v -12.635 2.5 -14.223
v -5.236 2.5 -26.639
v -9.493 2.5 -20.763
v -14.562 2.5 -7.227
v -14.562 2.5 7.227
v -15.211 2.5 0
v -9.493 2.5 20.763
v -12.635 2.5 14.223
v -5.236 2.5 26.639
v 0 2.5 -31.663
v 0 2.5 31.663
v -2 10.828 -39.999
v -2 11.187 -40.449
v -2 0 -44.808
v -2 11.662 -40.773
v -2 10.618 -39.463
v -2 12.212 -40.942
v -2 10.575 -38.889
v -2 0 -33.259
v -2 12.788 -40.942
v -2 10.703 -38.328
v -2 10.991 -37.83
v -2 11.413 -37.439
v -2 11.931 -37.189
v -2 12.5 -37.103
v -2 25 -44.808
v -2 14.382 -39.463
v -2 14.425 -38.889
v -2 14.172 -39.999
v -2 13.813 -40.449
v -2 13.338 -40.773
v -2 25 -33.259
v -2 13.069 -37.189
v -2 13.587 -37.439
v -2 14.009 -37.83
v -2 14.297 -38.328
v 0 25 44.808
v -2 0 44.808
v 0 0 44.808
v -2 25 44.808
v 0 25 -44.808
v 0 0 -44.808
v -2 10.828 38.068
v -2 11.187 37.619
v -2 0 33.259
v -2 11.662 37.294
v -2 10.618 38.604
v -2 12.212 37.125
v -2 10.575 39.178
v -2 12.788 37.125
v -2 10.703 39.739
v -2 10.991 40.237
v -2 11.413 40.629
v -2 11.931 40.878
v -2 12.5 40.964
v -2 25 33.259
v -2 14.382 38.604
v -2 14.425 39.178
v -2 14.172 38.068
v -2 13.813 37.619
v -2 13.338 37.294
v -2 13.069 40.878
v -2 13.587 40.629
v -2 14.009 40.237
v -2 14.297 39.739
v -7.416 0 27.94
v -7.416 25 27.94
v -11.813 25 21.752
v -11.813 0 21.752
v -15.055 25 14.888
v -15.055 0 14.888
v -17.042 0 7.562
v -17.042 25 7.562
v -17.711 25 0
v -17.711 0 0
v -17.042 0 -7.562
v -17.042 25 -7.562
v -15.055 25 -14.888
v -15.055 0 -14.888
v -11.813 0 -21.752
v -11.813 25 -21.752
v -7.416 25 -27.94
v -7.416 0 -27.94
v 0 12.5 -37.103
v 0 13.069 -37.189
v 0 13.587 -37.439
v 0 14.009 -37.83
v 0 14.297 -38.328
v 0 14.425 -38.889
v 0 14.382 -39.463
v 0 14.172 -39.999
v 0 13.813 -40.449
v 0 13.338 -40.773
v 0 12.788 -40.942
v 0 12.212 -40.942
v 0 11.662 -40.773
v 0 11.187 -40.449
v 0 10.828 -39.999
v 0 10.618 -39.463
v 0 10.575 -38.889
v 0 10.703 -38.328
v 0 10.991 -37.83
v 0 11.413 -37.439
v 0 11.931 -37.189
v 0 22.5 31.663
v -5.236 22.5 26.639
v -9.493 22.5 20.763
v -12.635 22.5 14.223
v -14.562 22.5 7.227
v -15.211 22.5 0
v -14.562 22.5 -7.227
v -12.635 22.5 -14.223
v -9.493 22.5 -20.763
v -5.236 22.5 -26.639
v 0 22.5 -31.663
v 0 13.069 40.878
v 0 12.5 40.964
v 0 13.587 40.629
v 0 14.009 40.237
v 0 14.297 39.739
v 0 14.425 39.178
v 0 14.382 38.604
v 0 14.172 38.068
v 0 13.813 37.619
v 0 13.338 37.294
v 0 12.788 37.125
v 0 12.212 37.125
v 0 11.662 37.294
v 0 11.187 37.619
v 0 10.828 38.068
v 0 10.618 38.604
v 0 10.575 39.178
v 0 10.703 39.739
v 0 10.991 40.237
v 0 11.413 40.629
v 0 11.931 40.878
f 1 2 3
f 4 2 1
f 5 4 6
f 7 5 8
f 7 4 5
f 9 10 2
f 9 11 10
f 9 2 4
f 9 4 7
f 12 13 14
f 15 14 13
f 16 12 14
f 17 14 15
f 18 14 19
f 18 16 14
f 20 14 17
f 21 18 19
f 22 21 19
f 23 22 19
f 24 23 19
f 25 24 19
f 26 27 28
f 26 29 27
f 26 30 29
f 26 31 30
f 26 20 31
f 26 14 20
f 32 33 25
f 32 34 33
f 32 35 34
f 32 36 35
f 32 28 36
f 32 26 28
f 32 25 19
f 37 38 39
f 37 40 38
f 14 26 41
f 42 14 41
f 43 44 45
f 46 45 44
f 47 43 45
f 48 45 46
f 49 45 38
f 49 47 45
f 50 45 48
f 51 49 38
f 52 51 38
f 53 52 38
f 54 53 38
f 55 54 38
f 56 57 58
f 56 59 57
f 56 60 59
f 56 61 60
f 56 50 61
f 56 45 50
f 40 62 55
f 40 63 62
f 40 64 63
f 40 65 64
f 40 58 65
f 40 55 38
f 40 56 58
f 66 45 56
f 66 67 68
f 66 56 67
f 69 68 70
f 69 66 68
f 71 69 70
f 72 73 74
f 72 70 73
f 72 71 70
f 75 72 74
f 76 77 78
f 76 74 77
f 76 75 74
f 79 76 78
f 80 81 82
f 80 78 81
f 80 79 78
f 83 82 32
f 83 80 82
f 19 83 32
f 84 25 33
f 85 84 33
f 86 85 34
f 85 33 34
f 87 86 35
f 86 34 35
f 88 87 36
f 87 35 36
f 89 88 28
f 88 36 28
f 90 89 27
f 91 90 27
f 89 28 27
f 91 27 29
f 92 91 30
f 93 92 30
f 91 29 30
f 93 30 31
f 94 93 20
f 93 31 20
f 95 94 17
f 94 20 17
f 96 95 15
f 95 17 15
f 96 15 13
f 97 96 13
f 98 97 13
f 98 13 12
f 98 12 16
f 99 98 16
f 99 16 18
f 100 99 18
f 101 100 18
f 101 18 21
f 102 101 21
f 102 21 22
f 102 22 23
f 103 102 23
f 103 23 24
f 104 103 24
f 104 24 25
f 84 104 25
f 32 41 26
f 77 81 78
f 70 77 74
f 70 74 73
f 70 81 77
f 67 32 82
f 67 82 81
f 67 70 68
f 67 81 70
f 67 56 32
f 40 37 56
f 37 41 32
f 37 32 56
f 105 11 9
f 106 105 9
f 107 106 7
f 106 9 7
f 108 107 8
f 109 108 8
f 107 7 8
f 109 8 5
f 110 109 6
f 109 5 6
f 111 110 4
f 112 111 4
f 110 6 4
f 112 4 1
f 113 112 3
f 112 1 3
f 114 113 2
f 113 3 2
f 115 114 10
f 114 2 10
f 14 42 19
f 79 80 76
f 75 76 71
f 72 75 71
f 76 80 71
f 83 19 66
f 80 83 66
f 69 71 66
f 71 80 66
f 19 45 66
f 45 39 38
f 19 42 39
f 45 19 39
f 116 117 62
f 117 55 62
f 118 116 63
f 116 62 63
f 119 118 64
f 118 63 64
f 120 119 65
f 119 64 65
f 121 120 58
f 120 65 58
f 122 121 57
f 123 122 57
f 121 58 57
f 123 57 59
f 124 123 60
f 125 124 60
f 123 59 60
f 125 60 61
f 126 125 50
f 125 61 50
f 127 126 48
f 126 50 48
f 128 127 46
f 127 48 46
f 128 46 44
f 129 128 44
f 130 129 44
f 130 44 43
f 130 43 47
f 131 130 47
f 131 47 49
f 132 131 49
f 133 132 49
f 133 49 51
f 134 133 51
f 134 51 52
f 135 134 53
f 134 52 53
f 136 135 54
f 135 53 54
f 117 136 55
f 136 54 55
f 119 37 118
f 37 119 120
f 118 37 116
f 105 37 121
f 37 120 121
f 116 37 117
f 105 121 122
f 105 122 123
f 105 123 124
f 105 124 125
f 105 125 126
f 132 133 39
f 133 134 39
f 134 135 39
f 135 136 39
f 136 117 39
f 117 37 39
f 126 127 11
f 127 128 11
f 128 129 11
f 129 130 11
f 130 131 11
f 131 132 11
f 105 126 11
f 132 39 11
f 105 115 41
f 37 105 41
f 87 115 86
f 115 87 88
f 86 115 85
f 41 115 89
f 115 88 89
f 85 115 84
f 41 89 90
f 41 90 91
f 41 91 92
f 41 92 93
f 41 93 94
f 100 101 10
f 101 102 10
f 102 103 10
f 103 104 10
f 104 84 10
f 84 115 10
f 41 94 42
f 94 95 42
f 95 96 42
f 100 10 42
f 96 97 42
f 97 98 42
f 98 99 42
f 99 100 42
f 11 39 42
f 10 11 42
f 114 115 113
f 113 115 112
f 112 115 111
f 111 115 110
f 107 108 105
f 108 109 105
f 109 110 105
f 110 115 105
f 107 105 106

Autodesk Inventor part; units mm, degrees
ref_plane "YZ Plane" through (0, 0, 0) normal (1, 0, 0) x (0, 1, 0)
ref_plane "XZ Plane" through (0, 0, 0) normal (0, 1, 0) x (-1, 0, 0)
ref_plane "XY Plane" through (0, 0, 0) normal (0, 0, 1) x (1, 0, 0)
sketch "Sketch1" plane through (0, 0, 0) normal (0, 1, 0) x (-1, 0, 0)
  circle A0 centre (-25.3492, 0) radius 35.56 construction
  line L0 (0, 84.1375) -> (6.35, 84.1375) construction
  line L1 (6.35, 84.1375) -> (6.35, -68.2625) construction
  line L2 (6.35, -68.2625) -> (0, -68.2625) construction
  line L3 (0, -68.2625) -> (0, 84.1375) construction
  arc A1 (0, -34.8078) -> (0, 34.8078) centre (-25.3492, 0) ccw
  line L4 (0, 34.8078) -> (0, -34.8078)
  point P0 (0, 0)
  point P1 (6.35, 29.1432)
  point P2 (6.35, -29.1432)
  dimension "d0" = 71.12
  dimension "d1" = 25.3492
  dimension "d2" = 6.35
  dimension "d3" = 152.4
  dimension "d4" = 86.12
extrude "Extrusion1" add sketch "Sketch1" along normal blind 25
shell "Shell2" thickness 2.5 removed faces 1 at (0, 8.3333, 11.6026)
sketch "Sketch2" plane through (0, 25, 0) normal (0, 1, 0) x (1, 0, 0)
  line L0 (0, 34.8078) -> (-2, 34.8078)
  line L1 (-2, 34.8078) -> (-2, 44.8078)
  line L2 (-2, 44.8078) -> (0, 44.8078)
  line L3 (0, 44.8078) -> (0, 34.8078)
  line L4 (-2, 34.8078) -> (0, 34.8078)
  line L5 (0.2807, 0) -> (-17.7108, 0) construction
  arc A0 (0, 34.8078) -> (0, -34.8078) centre (25.3492, 0) ccw construction
  line L6 (0, 34.8078) -> (-2, 34.8078)
  line L7 (-2, 34.8078) -> (-2, 33.2594)
  line L8 (-2, 33.2594) -> (0, 33.2594)
  line L9 (0, 33.2594) -> (0, 34.8078)
  line L10 (0, -34.8078) -> (-2, -34.8078)
  line L11 (-2, -34.8078) -> (-2, -44.8078)
  line L12 (-2, -44.8078) -> (0, -44.8078)
  line L13 (0, -44.8078) -> (0, -34.8078)
  line L14 (-2, -34.8078) -> (0, -34.8078)
  arc A1 (0, 34.8078) -> (0, -34.8078) centre (25.3492, 0) ccw construction
  line L15 (0, -34.8078) -> (-2, -34.8078)
  line L16 (-2, -34.8078) -> (-2, -33.2594)
  line L17 (-2, -33.2594) -> (0, -33.2594)
  line L18 (0, -33.2594) -> (0, -34.8078)
  point P0 (0, 0)
  dimension "d9" = 2
  dimension "d10" = 10
  dimension "d15" = 0
  dimension "d16" = 2
extrude "Extrusion2" add sketch "Sketch2" against normal up to surface (25 mm away)
sketch "Sketch3" plane through (-2, 25, 33.2594) normal (-1, 0, 0) x (0, 0, 1)
  circle A0 centre (5.7742, -12.5) radius 1.9304
  line L0 (11.5484, -25) -> (0, -25) projected
  line L1 (0, 0) -> (11.5484, 0) projected
  line L2 (0, -25) -> (0, 0) projected
  line L3 (11.5484, 0) -> (11.5484, -25) projected
  circle A1 centre (-72.2929, -12.5) radius 1.9304
  line L4 (-78.0671, 0) -> (-78.0671, -25) projected
  line L5 (-78.0671, 0) -> (-66.5187, 0) projected
  point P0 (-33.2594, -25)
  dimension "d17" = 3.8608
  dimension "d18" = 25
  dimension "d19" = 12.5
  dimension "d20" = 11.5484
  dimension "d21" = 5.7742
  dimension "d22" = 3.8608
  dimension "d23" = 5.7742
  dimension "d24" = 12.5
extrude "Extrusion3" cut sketch "Sketch3" against normal through all contours A0 | A1
equation "\"d19\" = 0.5 * d18"
equation "\"d21\" = 0.5 * d20"
equation "\"d23\" = d21"
equation "\"d24\" = d19"
properties part number "sprocket cover"
